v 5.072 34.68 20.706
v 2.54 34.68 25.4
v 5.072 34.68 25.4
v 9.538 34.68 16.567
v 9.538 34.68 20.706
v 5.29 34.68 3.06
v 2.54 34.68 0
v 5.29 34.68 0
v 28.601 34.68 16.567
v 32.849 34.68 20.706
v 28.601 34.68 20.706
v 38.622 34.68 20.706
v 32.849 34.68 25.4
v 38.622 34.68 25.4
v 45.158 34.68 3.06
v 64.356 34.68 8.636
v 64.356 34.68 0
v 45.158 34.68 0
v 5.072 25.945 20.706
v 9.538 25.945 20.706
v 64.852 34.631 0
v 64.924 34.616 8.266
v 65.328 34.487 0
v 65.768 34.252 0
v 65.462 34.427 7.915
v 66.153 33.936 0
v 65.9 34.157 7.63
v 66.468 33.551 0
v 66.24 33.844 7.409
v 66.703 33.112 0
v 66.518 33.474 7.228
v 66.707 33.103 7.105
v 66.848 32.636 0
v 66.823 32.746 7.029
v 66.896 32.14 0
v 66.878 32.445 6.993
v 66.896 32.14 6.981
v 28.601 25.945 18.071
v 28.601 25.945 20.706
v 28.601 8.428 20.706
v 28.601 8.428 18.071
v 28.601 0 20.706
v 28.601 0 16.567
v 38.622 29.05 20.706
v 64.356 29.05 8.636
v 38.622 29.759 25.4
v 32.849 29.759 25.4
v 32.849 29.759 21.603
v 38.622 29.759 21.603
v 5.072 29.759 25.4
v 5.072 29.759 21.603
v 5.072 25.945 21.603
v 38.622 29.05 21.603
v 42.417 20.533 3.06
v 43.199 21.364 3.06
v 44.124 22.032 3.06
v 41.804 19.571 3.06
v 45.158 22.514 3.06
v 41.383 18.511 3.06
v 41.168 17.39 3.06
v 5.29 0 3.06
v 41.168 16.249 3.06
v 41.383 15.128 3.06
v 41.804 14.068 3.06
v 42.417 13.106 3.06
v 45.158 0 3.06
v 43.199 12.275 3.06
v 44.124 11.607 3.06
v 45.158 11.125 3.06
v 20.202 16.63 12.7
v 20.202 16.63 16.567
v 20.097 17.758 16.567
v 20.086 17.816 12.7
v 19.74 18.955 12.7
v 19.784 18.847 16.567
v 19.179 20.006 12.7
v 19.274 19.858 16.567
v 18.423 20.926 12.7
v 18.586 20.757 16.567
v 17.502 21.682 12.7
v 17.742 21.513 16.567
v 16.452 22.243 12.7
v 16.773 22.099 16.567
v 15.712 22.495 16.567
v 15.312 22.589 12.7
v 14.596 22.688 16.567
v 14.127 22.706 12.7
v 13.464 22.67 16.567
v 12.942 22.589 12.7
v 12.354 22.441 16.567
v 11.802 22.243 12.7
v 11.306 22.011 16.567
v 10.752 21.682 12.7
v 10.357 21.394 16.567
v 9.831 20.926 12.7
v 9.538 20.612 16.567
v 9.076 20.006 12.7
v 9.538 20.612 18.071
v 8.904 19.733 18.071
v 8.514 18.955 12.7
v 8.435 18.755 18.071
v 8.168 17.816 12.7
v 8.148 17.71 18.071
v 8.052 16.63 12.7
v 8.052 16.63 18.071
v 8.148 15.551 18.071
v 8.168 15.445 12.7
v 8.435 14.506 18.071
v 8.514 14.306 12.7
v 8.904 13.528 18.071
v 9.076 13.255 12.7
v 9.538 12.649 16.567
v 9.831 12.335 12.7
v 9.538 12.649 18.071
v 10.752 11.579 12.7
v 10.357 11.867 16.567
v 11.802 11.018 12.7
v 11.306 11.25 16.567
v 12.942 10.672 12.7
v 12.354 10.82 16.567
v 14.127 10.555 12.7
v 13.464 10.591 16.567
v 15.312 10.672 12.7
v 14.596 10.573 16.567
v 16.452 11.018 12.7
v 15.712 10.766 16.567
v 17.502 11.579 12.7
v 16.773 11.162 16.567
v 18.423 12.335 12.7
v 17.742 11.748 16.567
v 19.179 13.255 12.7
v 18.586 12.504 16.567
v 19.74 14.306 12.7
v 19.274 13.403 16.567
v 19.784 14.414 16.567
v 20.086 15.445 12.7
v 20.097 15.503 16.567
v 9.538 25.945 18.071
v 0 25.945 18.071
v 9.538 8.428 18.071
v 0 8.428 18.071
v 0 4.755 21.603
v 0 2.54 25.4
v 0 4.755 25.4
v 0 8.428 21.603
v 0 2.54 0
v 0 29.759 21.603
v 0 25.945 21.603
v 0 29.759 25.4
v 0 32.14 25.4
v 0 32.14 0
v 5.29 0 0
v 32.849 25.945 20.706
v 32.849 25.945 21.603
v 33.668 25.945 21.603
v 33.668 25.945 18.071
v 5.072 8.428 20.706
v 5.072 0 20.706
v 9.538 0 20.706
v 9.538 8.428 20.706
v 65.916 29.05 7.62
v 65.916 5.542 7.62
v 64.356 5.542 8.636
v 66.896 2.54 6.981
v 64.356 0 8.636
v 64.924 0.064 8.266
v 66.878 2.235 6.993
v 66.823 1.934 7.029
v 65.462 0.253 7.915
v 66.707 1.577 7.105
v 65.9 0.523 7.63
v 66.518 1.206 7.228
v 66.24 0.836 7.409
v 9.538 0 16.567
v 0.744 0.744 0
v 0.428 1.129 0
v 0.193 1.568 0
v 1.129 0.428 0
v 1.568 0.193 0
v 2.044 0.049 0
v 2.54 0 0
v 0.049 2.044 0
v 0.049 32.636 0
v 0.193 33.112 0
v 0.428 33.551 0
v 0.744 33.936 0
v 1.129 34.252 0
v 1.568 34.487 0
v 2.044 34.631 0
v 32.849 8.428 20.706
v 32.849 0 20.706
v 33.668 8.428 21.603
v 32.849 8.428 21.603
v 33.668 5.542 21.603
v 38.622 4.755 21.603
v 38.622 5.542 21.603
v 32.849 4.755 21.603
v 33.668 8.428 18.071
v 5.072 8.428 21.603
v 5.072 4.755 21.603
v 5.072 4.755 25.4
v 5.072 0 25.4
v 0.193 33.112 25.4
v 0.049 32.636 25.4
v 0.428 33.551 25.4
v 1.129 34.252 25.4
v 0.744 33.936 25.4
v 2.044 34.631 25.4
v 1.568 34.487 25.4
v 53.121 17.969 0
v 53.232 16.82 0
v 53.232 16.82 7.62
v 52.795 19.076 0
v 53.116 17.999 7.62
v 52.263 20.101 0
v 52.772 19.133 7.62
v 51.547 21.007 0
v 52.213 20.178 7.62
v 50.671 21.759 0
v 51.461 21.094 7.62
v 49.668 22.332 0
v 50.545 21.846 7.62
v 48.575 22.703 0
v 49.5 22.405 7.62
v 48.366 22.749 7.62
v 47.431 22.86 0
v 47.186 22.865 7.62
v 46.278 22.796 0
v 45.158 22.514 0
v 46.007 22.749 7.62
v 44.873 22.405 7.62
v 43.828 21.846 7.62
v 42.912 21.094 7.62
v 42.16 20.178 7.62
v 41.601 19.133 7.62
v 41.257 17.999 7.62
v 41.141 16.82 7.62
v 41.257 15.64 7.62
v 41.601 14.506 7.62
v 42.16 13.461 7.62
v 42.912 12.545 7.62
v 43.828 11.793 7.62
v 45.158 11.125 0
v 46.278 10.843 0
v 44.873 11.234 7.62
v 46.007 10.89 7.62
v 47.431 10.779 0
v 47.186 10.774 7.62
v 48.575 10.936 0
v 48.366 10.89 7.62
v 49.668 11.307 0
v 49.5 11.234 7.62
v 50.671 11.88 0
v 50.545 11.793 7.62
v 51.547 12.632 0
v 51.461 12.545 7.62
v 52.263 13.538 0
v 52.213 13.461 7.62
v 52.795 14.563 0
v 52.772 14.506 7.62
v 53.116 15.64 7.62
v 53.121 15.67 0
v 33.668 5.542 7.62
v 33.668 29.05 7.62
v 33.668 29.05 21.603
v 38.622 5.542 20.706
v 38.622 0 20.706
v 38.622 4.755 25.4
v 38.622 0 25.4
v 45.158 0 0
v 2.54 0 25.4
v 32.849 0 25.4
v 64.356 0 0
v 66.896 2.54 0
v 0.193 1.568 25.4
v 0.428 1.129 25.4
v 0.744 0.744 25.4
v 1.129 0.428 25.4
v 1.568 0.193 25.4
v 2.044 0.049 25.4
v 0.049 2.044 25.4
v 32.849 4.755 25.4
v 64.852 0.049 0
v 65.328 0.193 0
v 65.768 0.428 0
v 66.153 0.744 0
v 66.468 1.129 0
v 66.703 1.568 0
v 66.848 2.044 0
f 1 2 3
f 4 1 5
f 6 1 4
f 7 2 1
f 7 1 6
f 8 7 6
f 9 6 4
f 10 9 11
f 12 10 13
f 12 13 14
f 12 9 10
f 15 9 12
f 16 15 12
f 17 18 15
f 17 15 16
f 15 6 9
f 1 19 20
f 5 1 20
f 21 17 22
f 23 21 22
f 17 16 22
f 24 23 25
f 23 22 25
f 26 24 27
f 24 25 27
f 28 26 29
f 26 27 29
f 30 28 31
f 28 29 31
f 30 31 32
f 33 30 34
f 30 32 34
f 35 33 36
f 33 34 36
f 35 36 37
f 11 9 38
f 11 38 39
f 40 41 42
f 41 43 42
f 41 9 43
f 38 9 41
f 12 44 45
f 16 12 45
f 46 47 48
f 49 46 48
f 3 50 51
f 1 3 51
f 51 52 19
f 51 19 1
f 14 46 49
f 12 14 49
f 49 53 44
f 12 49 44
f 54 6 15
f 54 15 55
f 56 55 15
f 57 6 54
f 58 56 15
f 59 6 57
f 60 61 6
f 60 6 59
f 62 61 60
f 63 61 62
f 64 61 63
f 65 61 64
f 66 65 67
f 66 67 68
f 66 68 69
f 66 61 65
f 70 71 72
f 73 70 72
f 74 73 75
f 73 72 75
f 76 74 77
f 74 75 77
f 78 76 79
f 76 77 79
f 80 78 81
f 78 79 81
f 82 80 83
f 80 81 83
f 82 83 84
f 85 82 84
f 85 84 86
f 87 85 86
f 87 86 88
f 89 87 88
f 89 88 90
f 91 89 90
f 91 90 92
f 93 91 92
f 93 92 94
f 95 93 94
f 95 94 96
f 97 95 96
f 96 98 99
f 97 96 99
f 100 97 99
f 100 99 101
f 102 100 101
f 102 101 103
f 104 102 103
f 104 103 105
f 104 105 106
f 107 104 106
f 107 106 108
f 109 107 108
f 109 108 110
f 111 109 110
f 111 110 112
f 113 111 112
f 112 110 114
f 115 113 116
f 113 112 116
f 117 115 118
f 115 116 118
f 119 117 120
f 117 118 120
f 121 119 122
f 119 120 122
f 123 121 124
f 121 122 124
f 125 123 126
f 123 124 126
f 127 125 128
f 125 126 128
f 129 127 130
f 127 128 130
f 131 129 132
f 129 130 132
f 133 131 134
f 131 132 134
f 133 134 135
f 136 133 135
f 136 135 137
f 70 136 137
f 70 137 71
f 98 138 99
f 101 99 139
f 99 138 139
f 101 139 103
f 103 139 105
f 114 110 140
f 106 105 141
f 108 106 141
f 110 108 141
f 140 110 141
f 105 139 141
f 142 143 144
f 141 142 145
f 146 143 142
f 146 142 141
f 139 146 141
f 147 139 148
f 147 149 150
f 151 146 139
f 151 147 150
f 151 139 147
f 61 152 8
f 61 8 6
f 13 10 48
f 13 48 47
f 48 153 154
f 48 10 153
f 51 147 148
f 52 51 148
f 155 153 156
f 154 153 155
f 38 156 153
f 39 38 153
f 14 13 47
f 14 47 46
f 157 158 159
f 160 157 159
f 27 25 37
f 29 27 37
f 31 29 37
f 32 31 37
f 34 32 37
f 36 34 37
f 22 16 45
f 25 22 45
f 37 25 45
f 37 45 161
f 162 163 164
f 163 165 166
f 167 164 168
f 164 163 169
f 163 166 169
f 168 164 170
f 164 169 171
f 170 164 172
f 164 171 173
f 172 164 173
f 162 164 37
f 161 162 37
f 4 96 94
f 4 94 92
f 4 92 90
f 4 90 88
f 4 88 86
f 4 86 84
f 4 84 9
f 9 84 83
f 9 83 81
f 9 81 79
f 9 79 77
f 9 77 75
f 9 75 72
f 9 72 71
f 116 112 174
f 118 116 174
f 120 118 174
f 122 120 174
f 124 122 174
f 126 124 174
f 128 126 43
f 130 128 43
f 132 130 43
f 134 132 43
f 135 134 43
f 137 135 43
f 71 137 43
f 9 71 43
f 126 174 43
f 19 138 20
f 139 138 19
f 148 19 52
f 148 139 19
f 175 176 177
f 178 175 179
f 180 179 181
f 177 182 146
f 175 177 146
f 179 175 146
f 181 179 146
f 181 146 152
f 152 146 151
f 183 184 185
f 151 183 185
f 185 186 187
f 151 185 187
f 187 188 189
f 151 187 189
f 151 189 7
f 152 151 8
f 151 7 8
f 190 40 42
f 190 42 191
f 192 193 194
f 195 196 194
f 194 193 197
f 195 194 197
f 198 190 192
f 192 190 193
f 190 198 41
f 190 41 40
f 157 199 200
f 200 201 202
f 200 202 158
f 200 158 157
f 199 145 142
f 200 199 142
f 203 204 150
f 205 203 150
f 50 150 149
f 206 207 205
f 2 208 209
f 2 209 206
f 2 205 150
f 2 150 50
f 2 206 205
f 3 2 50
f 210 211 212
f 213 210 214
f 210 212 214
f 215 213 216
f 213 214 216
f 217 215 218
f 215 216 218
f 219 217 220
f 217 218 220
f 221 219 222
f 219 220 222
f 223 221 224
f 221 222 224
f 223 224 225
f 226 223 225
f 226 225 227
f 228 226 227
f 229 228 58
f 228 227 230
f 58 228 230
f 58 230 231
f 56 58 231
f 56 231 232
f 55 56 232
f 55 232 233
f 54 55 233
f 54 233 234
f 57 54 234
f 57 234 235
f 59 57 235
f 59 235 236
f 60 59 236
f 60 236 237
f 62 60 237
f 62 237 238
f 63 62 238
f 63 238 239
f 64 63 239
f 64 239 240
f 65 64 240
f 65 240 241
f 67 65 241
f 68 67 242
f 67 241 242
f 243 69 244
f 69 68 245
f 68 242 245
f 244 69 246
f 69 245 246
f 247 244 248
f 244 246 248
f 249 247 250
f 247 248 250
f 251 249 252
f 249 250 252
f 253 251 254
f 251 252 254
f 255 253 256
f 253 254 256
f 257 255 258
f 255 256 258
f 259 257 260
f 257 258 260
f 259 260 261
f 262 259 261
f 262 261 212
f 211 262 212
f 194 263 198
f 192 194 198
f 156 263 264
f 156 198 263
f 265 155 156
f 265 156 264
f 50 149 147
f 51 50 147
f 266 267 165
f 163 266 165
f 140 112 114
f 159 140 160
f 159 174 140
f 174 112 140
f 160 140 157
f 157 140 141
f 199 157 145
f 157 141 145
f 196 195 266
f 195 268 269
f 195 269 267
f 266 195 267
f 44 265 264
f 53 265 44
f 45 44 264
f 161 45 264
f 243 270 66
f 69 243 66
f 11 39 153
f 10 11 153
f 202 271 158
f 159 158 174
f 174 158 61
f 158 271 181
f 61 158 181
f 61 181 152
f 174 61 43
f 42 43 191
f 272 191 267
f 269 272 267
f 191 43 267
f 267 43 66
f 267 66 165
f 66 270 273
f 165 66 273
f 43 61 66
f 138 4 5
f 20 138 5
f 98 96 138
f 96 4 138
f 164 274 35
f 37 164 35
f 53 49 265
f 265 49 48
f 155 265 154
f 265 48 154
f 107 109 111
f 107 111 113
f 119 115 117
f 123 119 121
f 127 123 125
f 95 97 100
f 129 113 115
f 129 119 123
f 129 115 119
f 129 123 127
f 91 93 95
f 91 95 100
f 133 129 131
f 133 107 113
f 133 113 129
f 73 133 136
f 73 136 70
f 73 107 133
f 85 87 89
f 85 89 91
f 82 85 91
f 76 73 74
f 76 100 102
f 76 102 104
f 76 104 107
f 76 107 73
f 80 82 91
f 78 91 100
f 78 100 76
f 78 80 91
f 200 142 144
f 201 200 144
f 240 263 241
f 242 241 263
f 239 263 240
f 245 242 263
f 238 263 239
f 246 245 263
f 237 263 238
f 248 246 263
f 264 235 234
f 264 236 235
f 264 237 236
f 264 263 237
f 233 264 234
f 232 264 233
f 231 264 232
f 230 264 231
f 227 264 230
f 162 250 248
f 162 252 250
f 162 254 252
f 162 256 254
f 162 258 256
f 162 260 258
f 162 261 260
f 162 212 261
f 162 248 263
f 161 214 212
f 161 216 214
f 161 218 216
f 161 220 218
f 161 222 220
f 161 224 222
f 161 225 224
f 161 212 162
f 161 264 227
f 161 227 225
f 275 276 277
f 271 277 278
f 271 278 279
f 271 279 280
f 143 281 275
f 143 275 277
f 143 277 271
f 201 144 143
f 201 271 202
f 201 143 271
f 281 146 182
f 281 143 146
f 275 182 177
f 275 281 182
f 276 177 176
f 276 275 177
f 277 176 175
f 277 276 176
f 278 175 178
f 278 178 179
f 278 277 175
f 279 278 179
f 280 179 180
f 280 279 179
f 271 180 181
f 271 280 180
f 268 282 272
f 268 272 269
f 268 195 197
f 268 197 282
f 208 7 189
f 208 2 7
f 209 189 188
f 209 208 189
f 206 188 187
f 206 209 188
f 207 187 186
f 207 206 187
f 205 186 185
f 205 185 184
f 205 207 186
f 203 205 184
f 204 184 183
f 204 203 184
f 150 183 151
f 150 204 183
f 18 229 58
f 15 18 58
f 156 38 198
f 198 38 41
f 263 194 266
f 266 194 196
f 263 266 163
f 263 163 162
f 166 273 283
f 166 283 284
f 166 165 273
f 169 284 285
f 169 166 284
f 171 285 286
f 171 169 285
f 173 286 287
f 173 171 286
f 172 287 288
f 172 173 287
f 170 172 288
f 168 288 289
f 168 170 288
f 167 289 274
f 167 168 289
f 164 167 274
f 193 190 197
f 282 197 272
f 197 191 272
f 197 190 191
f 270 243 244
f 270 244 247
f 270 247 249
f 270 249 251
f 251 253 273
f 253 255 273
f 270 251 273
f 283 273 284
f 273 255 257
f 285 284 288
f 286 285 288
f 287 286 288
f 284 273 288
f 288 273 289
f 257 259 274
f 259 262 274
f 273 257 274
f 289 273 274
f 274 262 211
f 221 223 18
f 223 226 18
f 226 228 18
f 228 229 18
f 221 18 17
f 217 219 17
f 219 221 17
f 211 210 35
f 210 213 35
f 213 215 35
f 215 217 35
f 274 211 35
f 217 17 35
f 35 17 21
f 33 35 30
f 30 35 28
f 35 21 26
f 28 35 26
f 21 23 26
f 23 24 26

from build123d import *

# Parameters (mm, degrees)
F0_W      = 66.8964758515
F0_H      = 34.6800498664
F1_DEPTH  = 25.4
F2_R      = 6.0452
F3_DEPTH  = 25.401
F4_R      = 6.0753950253
F5_DEPTH  = 12.7
F6_W      = 33.2289449871
F6_H      = 23.5078325495
F6_R      = 6.0452
F7_DEPTH  = 17.78
F8_W      = 19.0628441051
F8_H      = 4.1393600404
F8_W_2    = 39.8685750552
F8_H_2    = 3.0596489087
F9_DEPTH  = 34.6810498664
F10_W     = 17.5169128925
F10_H     = 3.5316348076
F11_DEPTH = 66.8974758515
F12_R     = 2.54
F13_R     = 2.54
F15_DEPTH = 34.6810498664


with BuildPart() as f1:
    # F0 (on Top) → F1 (new body)
    with BuildSketch(Plane.XY):
        with Locations((33.4482379258, 17.3400249332)):
            Rectangle(F0_W, F0_H)
    extrude(amount=F1_DEPTH)

    # F2 (on face) → F3 (cut, through all)
    with BuildSketch(Plane.XY.offset(25.4)):
        with Locations((47.1864789724, 16.8195329607)):
            Circle(F2_R)
    extrude(amount=-F3_DEPTH, mode=Mode.SUBTRACT)

    # F4 (on face) → F5 (cut)
    with BuildSketch(Plane.XY.offset(25.4)):
        with Locations((14.1270142049, 16.6304875165)):
            Circle(F4_R)
    extrude(amount=-F5_DEPTH, mode=Mode.SUBTRACT)

    # F6 (on face) → F7 (cut)
    with BuildSketch(Plane.XY.offset(25.4)):
        with Locations((50.282003358, 17.2961675562)):
            Rectangle(F6_W, F6_H)
        with Locations((47.1864789724, 16.8195329607)):
            Circle(F6_R, mode=Mode.SUBTRACT)
    extrude(amount=-F7_DEPTH, mode=Mode.SUBTRACT)

    # F8 (on face) → F9 (cut, through all)
    with BuildSketch(Plane.XZ):
        with Locations((19.0694048069, 18.6367146671)):
            Rectangle(F8_W, F8_H)
        Polygon((32.8491181135, 25.4), (5.0718318671, 25.4), (5.0718318671, 20.7063946873), (9.5379827544, 20.7063946873), (28.6008268595, 20.7063946873), (32.8491181135, 20.7063946873), align=None)
        Polygon((66.8964758515, 25.4), (38.6224351823, 25.4), (66.8964758515, 6.9811479189), align=None)
        with Locations((25.2239794936, 1.5298244543)):
            Rectangle(F8_W_2, F8_H_2)
    extrude(amount=-F9_DEPTH, mode=Mode.SUBTRACT)

    # F10 (on face) → F11 (cut, through all)
    with BuildSketch(Plane(origin=(0, 0, 0), x_dir=(0, -1, 0), z_dir=(-1, 0, 0))):
        Polygon((-4.7551710159, 25.4), (-29.7591537237, 25.4), (-29.7591537237, 21.6030925512), (-25.944987312, 21.6030925512), (-8.4280744195, 21.6030925512), (-4.7551710159, 21.6030925512), align=None)
        with Locations((-17.1865308657, 19.8372751474)):
            Rectangle(F10_W, F10_H)
    extrude(amount=-F11_DEPTH, mode=Mode.SUBTRACT)

    # F12
    f12_edges = [f1.edges().sort_by_distance(p)[0] for p in [
        (66.896476, 0, 3.490574),
        (66.896476, 34.68005, 3.490574),
    ]]
    fillet(f12_edges, radius=F12_R)

    # F13
    f13_edges = [f1.edges().sort_by_distance(p)[0] for p in [
        (0, 34.68005, 12.7),
        (0, 0, 12.7),
    ]]
    fillet(f13_edges, radius=F13_R)

    # F14 (on face) → F15 (cut, through all)
    with BuildSketch(Plane.XZ):
        Polygon((64.3564758515, 8.6358065095), (38.6224351823, 25.4), (38.6224351823, 20.7063946873), align=None)
    extrude(amount=-F15_DEPTH, mode=Mode.SUBTRACT)


solid = f1.part
